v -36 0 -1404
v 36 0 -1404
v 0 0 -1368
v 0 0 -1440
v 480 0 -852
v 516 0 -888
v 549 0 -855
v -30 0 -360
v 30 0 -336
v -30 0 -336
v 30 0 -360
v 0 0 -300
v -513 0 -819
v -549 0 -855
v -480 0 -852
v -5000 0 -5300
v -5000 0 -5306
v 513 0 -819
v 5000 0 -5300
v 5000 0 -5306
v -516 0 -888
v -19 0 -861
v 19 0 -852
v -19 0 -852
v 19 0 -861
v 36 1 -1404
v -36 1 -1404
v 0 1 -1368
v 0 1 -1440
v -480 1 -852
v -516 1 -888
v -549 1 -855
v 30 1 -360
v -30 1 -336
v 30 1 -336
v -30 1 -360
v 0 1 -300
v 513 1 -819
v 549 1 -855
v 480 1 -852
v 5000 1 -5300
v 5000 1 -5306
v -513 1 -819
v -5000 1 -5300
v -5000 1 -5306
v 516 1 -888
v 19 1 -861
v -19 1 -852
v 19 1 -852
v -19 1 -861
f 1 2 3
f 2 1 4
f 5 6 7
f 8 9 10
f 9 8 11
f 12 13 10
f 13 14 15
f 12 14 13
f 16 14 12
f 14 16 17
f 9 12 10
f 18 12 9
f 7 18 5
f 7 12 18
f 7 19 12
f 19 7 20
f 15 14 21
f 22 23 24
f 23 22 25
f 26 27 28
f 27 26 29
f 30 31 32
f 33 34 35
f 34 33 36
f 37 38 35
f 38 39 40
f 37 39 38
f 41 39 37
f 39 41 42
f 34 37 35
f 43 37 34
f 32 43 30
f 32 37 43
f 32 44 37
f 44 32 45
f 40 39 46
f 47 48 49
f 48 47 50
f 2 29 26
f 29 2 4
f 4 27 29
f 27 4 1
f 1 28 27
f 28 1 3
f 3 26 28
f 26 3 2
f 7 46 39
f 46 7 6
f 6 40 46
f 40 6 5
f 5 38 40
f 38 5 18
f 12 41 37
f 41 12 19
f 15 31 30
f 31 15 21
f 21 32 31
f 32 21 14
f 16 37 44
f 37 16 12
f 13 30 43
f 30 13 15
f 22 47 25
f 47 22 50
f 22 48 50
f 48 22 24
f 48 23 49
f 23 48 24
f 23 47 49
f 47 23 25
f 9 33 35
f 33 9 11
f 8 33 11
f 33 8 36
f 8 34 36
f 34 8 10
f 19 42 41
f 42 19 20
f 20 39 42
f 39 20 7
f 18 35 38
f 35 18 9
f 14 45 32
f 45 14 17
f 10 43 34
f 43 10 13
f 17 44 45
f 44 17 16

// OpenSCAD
$fs = 120;

$vpt = [0,1080,480];
$vpr = [-34,0,0];
$vpf = 45;

foul_line = 6;
plain_color = [1,1,1,0.8];
out_color = [1,0.75,0.75,0.8];
eat_color = [0.5,0.75,1,0.8];

// home, first, second, third, rubber
color([1,1,1]) scale([1,-1,-1]) rotate([90,0,0]) linear_extrude(1) {
    polygon([[-30,30*2+300],[30,30*2+300],[30,30+300],[0,300],[-30,30+300]]);
    polygon([[552-36*2,852],[552-36,852+36],[552,852],[552-36,852-36]]);
    polygon([[0,1404+36],[36,1404],[0,1404-36],[-36,1404]]);
    polygon([[-552+36*2,852],[-552+36,852+36],[-552,852],[-552+36,852-36]]);
    polygon([[-19,852],[19,852],[19,9+852],[-19,9+852]]);
}

// foul lines
color([1,1,1,0.5]) scale([1,-1,-1]) rotate([90,0,0]) linear_extrude(1) {
    polygon([[0,300],[-5000,300+5000],[-5000,300+5000+foul_line],[0,300+foul_line]]);
    polygon([[0,300],[5000,300+5000],[5000,300+5000+foul_line],[0,300+foul_line]]);
}

scale([0.1,0.1,-0.1]) translate([-23200,0,0]) {
    color(out_color) polyhedron([[4710,0,34710],[9920,0,38000],[4710,10000,34710],[9920,10000,38000]], [[0,1,3,2]]);
    color(out_color) polyhedron([[4710,0,34710],[3360,0,35840],[4710,10000,34710],[3360,10000,35840]], [[0,1,3,2]]);
    color(out_color) polyhedron([[9920,0,38000],[8570,0,39130],[9920,10000,38000],[8570,10000,39130]], [[0,1,3,2]]);
    color(out_color) polyhedron([[3360,0,35840],[8570,0,39130],[3360,10000,35840],[8570,10000,39130]], [[0,1,3,2]]);
    color(out_color) polyhedron([[4710,10000,34710],[3360,10000,35840],[9920,10000,38000],[8570,10000,39130]], [[0,1,3,2]]);
    color(out_color) polyhedron([[20370,0,1880],[20470,0,1880],[20370,1000,1880],[20470,1000,1880]], [[0,1,3,2]]);
    color(out_color) polyhedron([[20370,0,1880],[11610,0,11060],[20370,1000,1880],[11610,1000,11060]], [[0,1,3,2]]);
    color(out_color) polyhedron([[20470,0,1880],[11710,0,11060],[20470,1000,1880],[11710,1000,11060]], [[0,1,3,2]]);
    color(out_color) polyhedron([[11610,0,11060],[11710,0,11060],[11610,1000,11060],[11710,1000,11060]], [[0,1,3,2]]);
    color(out_color) polyhedron([[20370,1000,1880],[11610,1000,11060],[20470,1000,1880],[11710,1000,11060]], [[0,1,3,2]]);
    color(out_color) polyhedron([[7000,0,17526],[23910,0,31780],[7000,1200,17526],[23910,1200,31780]], [[0,1,3,2]]);
    color(out_color) polyhedron([[7000,0,17526],[7000,0,17536],[7000,1200,17526],[7000,1200,17536]], [[0,1,3,2]]);
    color(out_color) polyhedron([[23910,0,31780],[23910,0,31880],[23910,1200,31780],[23910,1200,31880]], [[0,1,3,2]]);
    color(out_color) polyhedron([[7000,0,17536],[23910,0,31880],[7000,1200,17536],[23910,1200,31880]], [[0,1,3,2]]);
    color(out_color) polyhedron([[7000,1200,17526],[7000,1200,17536],[23910,1200,31780],[23910,1200,31880]], [[0,1,3,2]]);
    color(out_color) polyhedron([[10010,0,42380],[23910,0,31780],[10010,1200,42380],[23910,1200,31780]], [[0,1,3,2]]);
    color(out_color) polyhedron([[10010,0,42380],[10010,0,43380],[10010,1200,42380],[10010,1200,43380]], [[0,1,3,2]]);
    color(out_color) polyhedron([[23910,0,31780],[23910,0,31880],[23910,1200,31780],[23910,1200,31880]], [[0,1,3,2]]);
    color(out_color) polyhedron([[10010,0,43380],[23910,0,31880],[10010,1200,43380],[23910,1200,31880]], [[0,1,3,2]]);
    color(out_color) polyhedron([[10010,1200,42380],[10010,1200,43380],[23910,1200,31780],[23910,1200,31880]], [[0,1,3,2]]);
    color(out_color) polyhedron([[23910,0,31780],[34390,0,41680],[23910,1200,31780],[34390,1200,41680]], [[0,1,3,2]]);
    color(out_color) polyhedron([[23910,0,31780],[23910,0,31880],[23910,1200,31780],[23910,1200,31880]], [[0,1,3,2]]);
    color(out_color) polyhedron([[34390,0,41680],[34390,0,41780],[34390,1200,41680],[34390,1200,41780]], [[0,1,3,2]]);
    color(out_color) polyhedron([[23910,0,31880],[34390,0,41780],[23910,1200,31880],[34390,1200,41780]], [[0,1,3,2]]);
    color(out_color) polyhedron([[23910,1200,31780],[23910,1200,31880],[34390,1200,41680],[34390,1200,41780]], [[0,1,3,2]]);
    color(out_color) polyhedron([[23910,0,31780],[40000,0,18656],[23910,1200,31780],[40000,1200,18656]], [[0,1,3,2]]);
    color(out_color) polyhedron([[23910,0,31780],[23910,0,31880],[23910,1200,31780],[23910,1200,31880]], [[0,1,3,2]]);
    color(out_color) polyhedron([[40000,0,18656],[40000,0,18666],[40000,1200,18656],[40000,1200,18666]], [[0,1,3,2]]);
    color(out_color) polyhedron([[23910,0,31880],[40000,0,18666],[23910,1200,31880],[40000,1200,18666]], [[0,1,3,2]]);
    color(out_color) polyhedron([[23910,1200,31780],[23910,1200,31880],[40000,1200,18656],[40000,1200,18666]], [[0,1,3,2]]);
    color(out_color) polyhedron([[32070,0,32440],[34250,0,31940],[32070,10000,32440],[34250,10000,31940]], [[0,1,3,2]]);
    color(out_color) polyhedron([[32070,0,32440],[32070,0,32540],[32070,10000,32440],[32070,10000,32540]], [[0,1,3,2]]);
    color(out_color) polyhedron([[34250,0,31940],[34250,0,32040],[34250,10000,31940],[34250,10000,32040]], [[0,1,3,2]]);
    color(out_color) polyhedron([[32070,0,32540],[34250,0,32040],[32070,10000,32540],[34250,10000,32040]], [[0,1,3,2]]);
    color(out_color) polyhedron([[32070,10000,32440],[32070,10000,32540],[34250,10000,31940],[34250,10000,32040]], [[0,1,3,2]]);
    color(out_color) polyhedron([[24650,0,1910],[35210,0,12300],[24650,5,1910],[35210,5,12300]], [[0,1,3,2]]);
    color(out_color) polyhedron([[24650,0,1910],[24650,0,2010],[24650,5,1910],[24650,5,2010]], [[0,1,3,2]]);
    color(out_color) polyhedron([[35210,0,12300],[35210,0,12400],[35210,5,12300],[35210,5,12400]], [[0,1,3,2]]);
    color(out_color) polyhedron([[24650,0,2010],[35210,0,12400],[24650,5,2010],[35210,5,12400]], [[0,1,3,2]]);
    color(out_color) polyhedron([[24650,5,1910],[24650,5,2010],[35210,5,12300],[35210,5,12400]], [[0,1,3,2]]);
    color(plain_color) polyhedron([[34620,0,22160],[36650,0,20500],[34620,1000,22160],[36650,1000,20500]], [[0,1,3,2]]);
    color(plain_color) polyhedron([[34620,0,22160],[34620,0,23040],[34620,1000,22160],[34620,1100,23040]], [[0,1,3,2]]);
    color(plain_color) polyhedron([[36650,0,20500],[36650,0,21380],[36650,1000,20500],[36650,1100,21380]], [[0,1,3,2]]);
    color(plain_color) polyhedron([[34620,0,23040],[36650,0,21380],[34620,1100,23040],[36650,1100,21380]], [[0,1,3,2]]);
    color(plain_color) polyhedron([[34620,1000,22160],[34620,1100,23040],[36650,1000,20500],[36650,1100,21380]], [[0,1,3,2]]);
    color(plain_color) polyhedron([[36500,0,16300],[37200,0,17000],[36500,1000,16300],[37200,1000,17000]], [[0,1,3,2]]);
    color(plain_color) polyhedron([[36500,0,16300],[36100,0,21820],[36500,1000,16300],[36100,1100,21820]], [[0,1,3,2]]);
    color(plain_color) polyhedron([[37200,0,17000],[37100,0,21010],[37200,1000,17000],[37100,1100,21010]], [[0,1,3,2]]);
    color(plain_color) polyhedron([[36100,0,21820],[37100,0,21010],[36100,1100,21820],[37100,1100,21010]], [[0,1,3,2]]);
    color(plain_color) polyhedron([[36500,1000,16300],[36100,1100,21820],[37200,1000,17000],[37100,1100,21010]], [[0,1,3,2]]);
    color(plain_color) polyhedron([[35010,0,16310],[35700,0,15500],[35010,900,16310],[35700,900,15500]], [[0,1,3,2]]);
    color(plain_color) polyhedron([[35010,0,16310],[39500,0,19300],[35010,900,16310],[39500,1000,19300]], [[0,1,3,2]]);
    color(plain_color) polyhedron([[35700,0,15500],[40190,0,20800],[35700,900,15500],[40190,1000,20800]], [[0,1,3,2]]);
    color(plain_color) polyhedron([[39500,0,19300],[40190,0,20800],[39500,1000,19300],[40190,1000,20800]], [[0,1,3,2]]);
    color(plain_color) polyhedron([[35010,900,16310],[39500,1000,19300],[35700,900,15500],[40190,1000,20800]], [[0,1,3,2]]);
    color(plain_color) polyhedron([[37200,0,17000],[37300,0,17000],[37200,2000,17000],[37300,2000,17000]], [[0,1,3,2]]);
    color(plain_color) polyhedron([[37200,0,17000],[37100,0,21010],[37200,2000,17000],[37100,2000,21010]], [[0,1,3,2]]);
    color(plain_color) polyhedron([[37300,0,17000],[37200,0,21010],[37300,2000,17000],[37200,2000,21010]], [[0,1,3,2]]);
    color(plain_color) polyhedron([[37100,0,21010],[37200,0,21010],[37100,2000,21010],[37200,2000,21010]], [[0,1,3,2]]);
    color(plain_color) polyhedron([[37200,2000,17000],[37100,2000,21010],[37300,2000,17000],[37200,2000,21010]], [[0,1,3,2]]);
    color(plain_color) polyhedron([[10830,0,13520],[11850,0,13040],[10830,500,13520],[11850,500,13040]], [[0,1,3,2]]);
    color(plain_color) polyhedron([[10830,0,13520],[11120,0,14160],[10830,500,13520],[11120,500,14160]], [[0,1,3,2]]);
    color(plain_color) polyhedron([[11850,0,13040],[12060,0,13940],[11850,500,13040],[12060,500,13940]], [[0,1,3,2]]);
    color(plain_color) polyhedron([[11120,0,14160],[12060,0,13940],[11120,500,14160],[12060,500,13940]], [[0,1,3,2]]);
    color(plain_color) polyhedron([[10830,500,13520],[11120,500,14160],[11850,500,13040],[12060,500,13940]], [[0,1,3,2]]);
    color(eat_color) polyhedron([[9740,0,26220],[11110,0,28270],[9740,700,26220],[11110,700,28270]], [[0,1,3,2]]);
    color(eat_color) polyhedron([[9740,0,26220],[8660,0,27280],[9740,700,26220],[8660,700,27280]], [[0,1,3,2]]);
    color(eat_color) polyhedron([[11110,0,28270],[10030,0,29330],[11110,700,28270],[10030,700,29330]], [[0,1,3,2]]);
    color(eat_color) polyhedron([[8660,0,27280],[10030,0,29330],[8660,700,27280],[10030,700,29330]], [[0,1,3,2]]);
    color(eat_color) polyhedron([[9740,700,26220],[8660,700,27280],[11110,700,28270],[10030,700,29330]], [[0,1,3,2]]);
    color(plain_color) polyhedron([[0,0,0],[0,0,0],[0,0,0],[0,0,0]], [[0,1,3,2]]);
    color(plain_color) polyhedron([[0,0,0],[0,0,0],[0,0,0],[0,0,0]], [[0,1,3,2]]);
    color(plain_color) polyhedron([[0,0,0],[0,0,0],[0,0,0],[0,0,0]], [[0,1,3,2]]);
    color(plain_color) polyhedron([[0,0,0],[0,0,0],[0,0,0],[0,0,0]], [[0,1,3,2]]);
    color(plain_color) polyhedron([[0,0,0],[0,0,0],[0,0,0],[0,0,0]], [[0,1,3,2]]);
    color(plain_color) polyhedron([[0,0,0],[0,0,0],[0,0,0],[0,0,0]], [[0,1,3,2]]);
    color(plain_color) polyhedron([[0,0,0],[0,0,0],[0,0,0],[0,0,0]], [[0,1,3,2]]);
    color(plain_color) polyhedron([[0,0,0],[0,0,0],[0,0,0],[0,0,0]], [[0,1,3,2]]);
    color(plain_color) polyhedron([[0,0,0],[0,0,0],[0,0,0],[0,0,0]], [[0,1,3,2]]);
    color(plain_color) polyhedron([[0,0,0],[0,0,0],[0,0,0],[0,0,0]], [[0,1,3,2]]);
    color(plain_color) polyhedron([[0,0,0],[0,0,0],[0,0,0],[0,0,0]], [[0,1,3,2]]);
    color(plain_color) polyhedron([[0,0,0],[0,0,0],[0,0,0],[0,0,0]], [[0,1,3,2]]);
    color(plain_color) polyhedron([[0,0,0],[0,0,0],[0,0,0],[0,0,0]], [[0,1,3,2]]);
    color(plain_color) polyhedron([[0,0,0],[0,0,0],[0,0,0],[0,0,0]], [[0,1,3,2]]);
    color(plain_color) polyhedron([[0,0,0],[0,0,0],[0,0,0],[0,0,0]], [[0,1,3,2]]);
    color(plain_color) polyhedron([[0,0,0],[0,0,0],[0,0,0],[0,0,0]], [[0,1,3,2]]);
    color(plain_color) polyhedron([[0,0,0],[0,0,0],[0,0,0],[0,0,0]], [[0,1,3,2]]);
    color(plain_color) polyhedron([[0,0,0],[0,0,0],[0,0,0],[0,0,0]], [[0,1,3,2]]);
    color(plain_color) polyhedron([[0,0,0],[0,0,0],[0,0,0],[0,0,0]], [[0,1,3,2]]);
    color(plain_color) polyhedron([[0,0,0],[0,0,0],[0,0,0],[0,0,0]], [[0,1,3,2]]);
    color(plain_color) polyhedron([[0,0,0],[0,0,0],[0,0,0],[0,0,0]], [[0,1,3,2]]);
    color(plain_color) polyhedron([[0,0,0],[0,0,0],[0,0,0],[0,0,0]], [[0,1,3,2]]);
    color(plain_color) polyhedron([[0,0,0],[0,0,0],[0,0,0],[0,0,0]], [[0,1,3,2]]);
    color(plain_color) polyhedron([[0,0,0],[0,0,0],[0,0,0],[0,0,0]], [[0,1,3,2]]);
    color(plain_color) polyhedron([[0,0,0],[0,0,0],[0,0,0],[0,0,0]], [[0,1,3,2]]);
    color(plain_color) polyhedron([[0,0,0],[0,0,0],[0,0,0],[0,0,0]], [[0,1,3,2]]);
    color(plain_color) polyhedron([[0,0,0],[0,0,0],[0,0,0],[0,0,0]], [[0,1,3,2]]);
    color(plain_color) polyhedron([[0,0,0],[0,0,0],[0,0,0],[0,0,0]], [[0,1,3,2]]);
    color(plain_color) polyhedron([[0,0,0],[0,0,0],[0,0,0],[0,0,0]], [[0,1,3,2]]);
    color(plain_color) polyhedron([[0,0,0],[0,0,0],[0,0,0],[0,0,0]], [[0,1,3,2]]);
    color(plain_color) polyhedron([[0,0,0],[0,0,0],[0,0,0],[0,0,0]], [[0,1,3,2]]);
    color(plain_color) polyhedron([[0,0,0],[0,0,0],[0,0,0],[0,0,0]], [[0,1,3,2]]);
    color(plain_color) polyhedron([[0,0,0],[0,0,0],[0,0,0],[0,0,0]], [[0,1,3,2]]);
    color(plain_color) polyhedron([[0,0,0],[0,0,0],[0,0,0],[0,0,0]], [[0,1,3,2]]);
    color(plain_color) polyhedron([[0,0,0],[0,0,0],[0,0,0],[0,0,0]], [[0,1,3,2]]);
    color(plain_color) polyhedron([[0,0,0],[0,0,0],[0,0,0],[0,0,0]], [[0,1,3,2]]);
    color(plain_color) polyhedron([[0,0,0],[0,0,0],[0,0,0],[0,0,0]], [[0,1,3,2]]);
    color(plain_color) polyhedron([[0,0,0],[0,0,0],[0,0,0],[0,0,0]], [[0,1,3,2]]);
    color(plain_color) polyhedron([[0,0,0],[0,0,0],[0,0,0],[0,0,0]], [[0,1,3,2]]);
    color(plain_color) polyhedron([[0,0,0],[0,0,0],[0,0,0],[0,0,0]], [[0,1,3,2]]);
    color(plain_color) polyhedron([[0,0,0],[0,0,0],[0,0,0],[0,0,0]], [[0,1,3,2]]);
    color(plain_color) polyhedron([[0,0,0],[0,0,0],[0,0,0],[0,0,0]], [[0,1,3,2]]);
    color(plain_color) polyhedron([[0,0,0],[0,0,0],[0,0,0],[0,0,0]], [[0,1,3,2]]);
    color(plain_color) polyhedron([[0,0,0],[0,0,0],[0,0,0],[0,0,0]], [[0,1,3,2]]);
    color(plain_color) polyhedron([[0,0,0],[0,0,0],[0,0,0],[0,0,0]], [[0,1,3,2]]);
    color(plain_color) polyhedron([[0,0,0],[0,0,0],[0,0,0],[0,0,0]], [[0,1,3,2]]);
    color(plain_color) polyhedron([[0,0,0],[0,0,0],[0,0,0],[0,0,0]], [[0,1,3,2]]);
    color(plain_color) polyhedron([[0,0,0],[0,0,0],[0,0,0],[0,0,0]], [[0,1,3,2]]);
    color(plain_color) polyhedron([[0,0,0],[0,0,0],[0,0,0],[0,0,0]], [[0,1,3,2]]);
    color(plain_color) polyhedron([[0,0,0],[0,0,0],[0,0,0],[0,0,0]], [[0,1,3,2]]);
    color(plain_color) polyhedron([[0,0,0],[0,0,0],[0,0,0],[0,0,0]], [[0,1,3,2]]);
    color(plain_color) polyhedron([[0,0,0],[0,0,0],[0,0,0],[0,0,0]], [[0,1,3,2]]);
    color(plain_color) polyhedron([[0,0,0],[0,0,0],[0,0,0],[0,0,0]], [[0,1,3,2]]);
    color(plain_color) polyhedron([[0,0,0],[0,0,0],[0,0,0],[0,0,0]], [[0,1,3,2]]);
    color(plain_color) polyhedron([[0,0,0],[0,0,0],[0,0,0],[0,0,0]], [[0,1,3,2]]);
    color(plain_color) polyhedron([[0,0,0],[0,0,0],[0,0,0],[0,0,0]], [[0,1,3,2]]);
    color(plain_color) polyhedron([[0,0,0],[0,0,0],[0,0,0],[0,0,0]], [[0,1,3,2]]);
    color(plain_color) polyhedron([[0,0,0],[0,0,0],[0,0,0],[0,0,0]], [[0,1,3,2]]);
    color(plain_color) polyhedron([[0,0,0],[0,0,0],[0,0,0],[0,0,0]], [[0,1,3,2]]);
    color(plain_color) polyhedron([[0,0,0],[0,0,0],[0,0,0],[0,0,0]], [[0,1,3,2]]);
    color(plain_color) polyhedron([[0,0,0],[0,0,0],[0,0,0],[0,0,0]], [[0,1,3,2]]);
    color(plain_color) polyhedron([[0,0,0],[0,0,0],[0,0,0],[0,0,0]], [[0,1,3,2]]);
    color(plain_color) polyhedron([[0,0,0],[0,0,0],[0,0,0],[0,0,0]], [[0,1,3,2]]);
    color(plain_color) polyhedron([[0,0,0],[0,0,0],[0,0,0],[0,0,0]], [[0,1,3,2]]);
    color(plain_color) polyhedron([[0,0,0],[0,0,0],[0,0,0],[0,0,0]], [[0,1,3,2]]);
    color(plain_color) polyhedron([[0,0,0],[0,0,0],[0,0,0],[0,0,0]], [[0,1,3,2]]);
    color(plain_color) polyhedron([[0,0,0],[0,0,0],[0,0,0],[0,0,0]], [[0,1,3,2]]);
    color(plain_color) polyhedron([[0,0,0],[0,0,0],[0,0,0],[0,0,0]], [[0,1,3,2]]);
    color(plain_color) polyhedron([[0,0,0],[0,0,0],[0,0,0],[0,0,0]], [[0,1,3,2]]);
    color(plain_color) polyhedron([[0,0,0],[0,0,0],[0,0,0],[0,0,0]], [[0,1,3,2]]);
    color(plain_color) polyhedron([[0,0,0],[0,0,0],[0,0,0],[0,0,0]], [[0,1,3,2]]);
    color(plain_color) polyhedron([[0,0,0],[0,0,0],[0,0,0],[0,0,0]], [[0,1,3,2]]);
    color(plain_color) polyhedron([[0,0,0],[0,0,0],[0,0,0],[0,0,0]], [[0,1,3,2]]);
    color(plain_color) polyhedron([[0,0,0],[0,0,0],[0,0,0],[0,0,0]], [[0,1,3,2]]);
    color(plain_color) polyhedron([[0,0,0],[0,0,0],[0,0,0],[0,0,0]], [[0,1,3,2]]);
    color(plain_color) polyhedron([[0,0,0],[0,0,0],[0,0,0],[0,0,0]], [[0,1,3,2]]);
    color(plain_color) polyhedron([[0,0,0],[0,0,0],[0,0,0],[0,0,0]], [[0,1,3,2]]);
    color(plain_color) polyhedron([[0,0,0],[0,0,0],[0,0,0],[0,0,0]], [[0,1,3,2]]);
    color(plain_color) polyhedron([[0,0,0],[0,0,0],[0,0,0],[0,0,0]], [[0,1,3,2]]);
    color(plain_color) polyhedron([[0,0,0],[0,0,0],[0,0,0],[0,0,0]], [[0,1,3,2]]);
    color(plain_color) polyhedron([[0,0,0],[0,0,0],[0,0,0],[0,0,0]], [[0,1,3,2]]);
    color(plain_color) polyhedron([[0,0,0],[0,0,0],[0,0,0],[0,0,0]], [[0,1,3,2]]);
    color(plain_color) polyhedron([[0,0,0],[0,0,0],[0,0,0],[0,0,0]], [[0,1,3,2]]);
    color(plain_color) polyhedron([[0,0,0],[0,0,0],[0,0,0],[0,0,0]], [[0,1,3,2]]);
    color(plain_color) polyhedron([[0,0,0],[0,0,0],[0,0,0],[0,0,0]], [[0,1,3,2]]);
    color(plain_color) polyhedron([[0,0,0],[0,0,0],[0,0,0],[0,0,0]], [[0,1,3,2]]);
    color(plain_color) polyhedron([[0,0,0],[0,0,0],[0,0,0],[0,0,0]], [[0,1,3,2]]);
    color(plain_color) polyhedron([[0,0,0],[0,0,0],[0,0,0],[0,0,0]], [[0,1,3,2]]);
    color(plain_color) polyhedron([[0,0,0],[0,0,0],[0,0,0],[0,0,0]], [[0,1,3,2]]);
    color(plain_color) polyhedron([[0,0,0],[0,0,0],[0,0,0],[0,0,0]], [[0,1,3,2]]);
    color(plain_color) polyhedron([[0,0,0],[0,0,0],[0,0,0],[0,0,0]], [[0,1,3,2]]);
    color(plain_color) polyhedron([[0,0,0],[0,0,0],[0,0,0],[0,0,0]], [[0,1,3,2]]);
    color(plain_color) polyhedron([[0,0,0],[0,0,0],[0,0,0],[0,0,0]], [[0,1,3,2]]);
    color(plain_color) polyhedron([[0,0,0],[0,0,0],[0,0,0],[0,0,0]], [[0,1,3,2]]);
    color(plain_color) polyhedron([[0,0,0],[0,0,0],[0,0,0],[0,0,0]], [[0,1,3,2]]);
    color(plain_color) polyhedron([[0,0,0],[0,0,0],[0,0,0],[0,0,0]], [[0,1,3,2]]);
    color(plain_color) polyhedron([[0,0,0],[0,0,0],[0,0,0],[0,0,0]], [[0,1,3,2]]);
    color(plain_color) polyhedron([[0,0,0],[0,0,0],[0,0,0],[0,0,0]], [[0,1,3,2]]);
    color(plain_color) polyhedron([[0,0,0],[0,0,0],[0,0,0],[0,0,0]], [[0,1,3,2]]);
    color(plain_color) polyhedron([[0,0,0],[0,0,0],[0,0,0],[0,0,0]], [[0,1,3,2]]);
    color(plain_color) polyhedron([[0,0,0],[0,0,0],[0,0,0],[0,0,0]], [[0,1,3,2]]);
    color(plain_color) polyhedron([[0,0,0],[0,0,0],[0,0,0],[0,0,0]], [[0,1,3,2]]);
    color(plain_color) polyhedron([[0,0,0],[0,0,0],[0,0,0],[0,0,0]], [[0,1,3,2]]);
    color(plain_color) polyhedron([[0,0,0],[0,0,0],[0,0,0],[0,0,0]], [[0,1,3,2]]);
    color(plain_color) polyhedron([[0,0,0],[0,0,0],[0,0,0],[0,0,0]], [[0,1,3,2]]);
    color(plain_color) polyhedron([[0,0,0],[0,0,0],[0,0,0],[0,0,0]], [[0,1,3,2]]);
    color(plain_color) polyhedron([[0,0,0],[0,0,0],[0,0,0],[0,0,0]], [[0,1,3,2]]);
    color(plain_color) polyhedron([[0,0,0],[0,0,0],[0,0,0],[0,0,0]], [[0,1,3,2]]);
    color(plain_color) polyhedron([[0,0,0],[0,0,0],[0,0,0],[0,0,0]], [[0,1,3,2]]);
    color(plain_color) polyhedron([[0,0,0],[0,0,0],[0,0,0],[0,0,0]], [[0,1,3,2]]);
    color(plain_color) polyhedron([[0,0,0],[0,0,0],[0,0,0],[0,0,0]], [[0,1,3,2]]);
    color(plain_color) polyhedron([[0,0,0],[0,0,0],[0,0,0],[0,0,0]], [[0,1,3,2]]);
    color(plain_color) polyhedron([[0,0,0],[0,0,0],[0,0,0],[0,0,0]], [[0,1,3,2]]);
    color(plain_color) polyhedron([[0,0,0],[0,0,0],[0,0,0],[0,0,0]], [[0,1,3,2]]);
    color(plain_color) polyhedron([[0,0,0],[0,0,0],[0,0,0],[0,0,0]], [[0,1,3,2]]);
    color(plain_color) polyhedron([[0,0,0],[0,0,0],[0,0,0],[0,0,0]], [[0,1,3,2]]);
    color(plain_color) polyhedron([[0,0,0],[0,0,0],[0,0,0],[0,0,0]], [[0,1,3,2]]);
    color(plain_color) polyhedron([[0,0,0],[0,0,0],[0,0,0],[0,0,0]], [[0,1,3,2]]);
    color(plain_color) polyhedron([[0,0,0],[0,0,0],[0,0,0],[0,0,0]], [[0,1,3,2]]);
    color(plain_color) polyhedron([[0,0,0],[0,0,0],[0,0,0],[0,0,0]], [[0,1,3,2]]);
    color(plain_color) polyhedron([[0,0,0],[0,0,0],[0,0,0],[0,0,0]], [[0,1,3,2]]);
    color(plain_color) polyhedron([[0,0,0],[0,0,0],[0,0,0],[0,0,0]], [[0,1,3,2]]);
    color(plain_color) polyhedron([[0,0,0],[0,0,0],[0,0,0],[0,0,0]], [[0,1,3,2]]);
    color(plain_color) polyhedron([[0,0,0],[0,0,0],[0,0,0],[0,0,0]], [[0,1,3,2]]);
    color(plain_color) polyhedron([[0,0,0],[0,0,0],[0,0,0],[0,0,0]], [[0,1,3,2]]);
    color(plain_color) polyhedron([[0,0,0],[0,0,0],[0,0,0],[0,0,0]], [[0,1,3,2]]);
    color(plain_color) polyhedron([[0,0,0],[0,0,0],[0,0,0],[0,0,0]], [[0,1,3,2]]);
    color(plain_color) polyhedron([[0,0,0],[0,0,0],[0,0,0],[0,0,0]], [[0,1,3,2]]);
    color(plain_color) polyhedron([[0,0,0],[0,0,0],[0,0,0],[0,0,0]], [[0,1,3,2]]);
    color(plain_color) polyhedron([[0,0,0],[0,0,0],[0,0,0],[0,0,0]], [[0,1,3,2]]);
    color(plain_color) polyhedron([[0,0,0],[0,0,0],[0,0,0],[0,0,0]], [[0,1,3,2]]);
    color(plain_color) polyhedron([[0,0,0],[0,0,0],[0,0,0],[0,0,0]], [[0,1,3,2]]);
    color(plain_color) polyhedron([[0,0,0],[0,0,0],[0,0,0],[0,0,0]], [[0,1,3,2]]);
    color(plain_color) polyhedron([[0,0,0],[0,0,0],[0,0,0],[0,0,0]], [[0,1,3,2]]);
    color(plain_color) polyhedron([[0,0,0],[0,0,0],[0,0,0],[0,0,0]], [[0,1,3,2]]);
    color(plain_color) polyhedron([[0,0,0],[0,0,0],[0,0,0],[0,0,0]], [[0,1,3,2]]);
    color(plain_color) polyhedron([[0,0,0],[0,0,0],[0,0,0],[0,0,0]], [[0,1,3,2]]);
    color(plain_color) polyhedron([[0,0,0],[0,0,0],[0,0,0],[0,0,0]], [[0,1,3,2]]);
    color(plain_color) polyhedron([[0,0,0],[0,0,0],[0,0,0],[0,0,0]], [[0,1,3,2]]);
    color(plain_color) polyhedron([[0,0,0],[0,0,0],[0,0,0],[0,0,0]], [[0,1,3,2]]);
    color(plain_color) polyhedron([[0,0,0],[0,0,0],[0,0,0],[0,0,0]], [[0,1,3,2]]);
    color(plain_color) polyhedron([[0,0,0],[0,0,0],[0,0,0],[0,0,0]], [[0,1,3,2]]);
    color(plain_color) polyhedron([[0,0,0],[0,0,0],[0,0,0],[0,0,0]], [[0,1,3,2]]);
    color(plain_color) polyhedron([[0,0,0],[0,0,0],[0,0,0],[0,0,0]], [[0,1,3,2]]);
    color(plain_color) polyhedron([[0,0,0],[0,0,0],[0,0,0],[0,0,0]], [[0,1,3,2]]);
    color(plain_color) polyhedron([[0,0,0],[0,0,0],[0,0,0],[0,0,0]], [[0,1,3,2]]);
    color(plain_color) polyhedron([[0,0,0],[0,0,0],[0,0,0],[0,0,0]], [[0,1,3,2]]);
    color(plain_color) polyhedron([[0,0,0],[0,0,0],[0,0,0],[0,0,0]], [[0,1,3,2]]);
    color(plain_color) polyhedron([[0,0,0],[0,0,0],[0,0,0],[0,0,0]], [[0,1,3,2]]);
    color(plain_color) polyhedron([[0,0,0],[0,0,0],[0,0,0],[0,0,0]], [[0,1,3,2]]);
    color(plain_color) polyhedron([[0,0,0],[0,0,0],[0,0,0],[0,0,0]], [[0,1,3,2]]);
    color(plain_color) polyhedron([[0,0,0],[0,0,0],[0,0,0],[0,0,0]], [[0,1,3,2]]);
    color(plain_color) polyhedron([[0,0,0],[0,0,0],[0,0,0],[0,0,0]], [[0,1,3,2]]);
    color(plain_color) polyhedron([[0,0,0],[0,0,0],[0,0,0],[0,0,0]], [[0,1,3,2]]);
    color(plain_color) polyhedron([[0,0,0],[0,0,0],[0,0,0],[0,0,0]], [[0,1,3,2]]);
    color(plain_color) polyhedron([[0,0,0],[0,0,0],[0,0,0],[0,0,0]], [[0,1,3,2]]);
    color(plain_color) polyhedron([[0,0,0],[0,0,0],[0,0,0],[0,0,0]], [[0,1,3,2]]);
    color(plain_color) polyhedron([[0,0,0],[0,0,0],[0,0,0],[0,0,0]], [[0,1,3,2]]);
    color(plain_color) polyhedron([[0,0,0],[0,0,0],[0,0,0],[0,0,0]], [[0,1,3,2]]);
    color(plain_color) polyhedron([[0,0,0],[0,0,0],[0,0,0],[0,0,0]], [[0,1,3,2]]);
    color(plain_color) polyhedron([[0,0,0],[0,0,0],[0,0,0],[0,0,0]], [[0,1,3,2]]);
    color(plain_color) polyhedron([[0,0,0],[0,0,0],[0,0,0],[0,0,0]], [[0,1,3,2]]);
    color(plain_color) polyhedron([[0,0,0],[0,0,0],[0,0,0],[0,0,0]], [[0,1,3,2]]);
    color(plain_color) polyhedron([[0,0,0],[0,0,0],[0,0,0],[0,0,0]], [[0,1,3,2]]);
    color(plain_color) polyhedron([[0,0,0],[0,0,0],[0,0,0],[0,0,0]], [[0,1,3,2]]);
    color(plain_color) polyhedron([[0,0,0],[0,0,0],[0,0,0],[0,0,0]], [[0,1,3,2]]);
    color(plain_color) polyhedron([[0,0,0],[0,0,0],[0,0,0],[0,0,0]], [[0,1,3,2]]);
    color(plain_color) polyhedron([[0,0,0],[0,0,0],[0,0,0],[0,0,0]], [[0,1,3,2]]);
    color(plain_color) polyhedron([[0,0,0],[0,0,0],[0,0,0],[0,0,0]], [[0,1,3,2]]);
    color(plain_color) polyhedron([[0,0,0],[0,0,0],[0,0,0],[0,0,0]], [[0,1,3,2]]);
    color(plain_color) polyhedron([[0,0,0],[0,0,0],[0,0,0],[0,0,0]], [[0,1,3,2]]);
    color(plain_color) polyhedron([[0,0,0],[0,0,0],[0,0,0],[0,0,0]], [[0,1,3,2]]);
    color(plain_color) polyhedron([[0,0,0],[0,0,0],[0,0,0],[0,0,0]], [[0,1,3,2]]);
    color(plain_color) polyhedron([[0,0,0],[0,0,0],[0,0,0],[0,0,0]], [[0,1,3,2]]);
    color(plain_color) polyhedron([[0,0,0],[0,0,0],[0,0,0],[0,0,0]], [[0,1,3,2]]);
    color(plain_color) polyhedron([[0,0,0],[0,0,0],[0,0,0],[0,0,0]], [[0,1,3,2]]);
    color(plain_color) polyhedron([[0,0,0],[0,0,0],[0,0,0],[0,0,0]], [[0,1,3,2]]);
    color(plain_color) polyhedron([[0,0,0],[0,0,0],[0,0,0],[0,0,0]], [[0,1,3,2]]);
    color(plain_color) polyhedron([[0,0,0],[0,0,0],[0,0,0],[0,0,0]], [[0,1,3,2]]);
    color(plain_color) polyhedron([[0,0,0],[0,0,0],[0,0,0],[0,0,0]], [[0,1,3,2]]);
    color(plain_color) polyhedron([[0,0,0],[0,0,0],[0,0,0],[0,0,0]], [[0,1,3,2]]);
    color(plain_color) polyhedron([[0,0,0],[0,0,0],[0,0,0],[0,0,0]], [[0,1,3,2]]);
    color(plain_color) polyhedron([[0,0,0],[0,0,0],[0,0,0],[0,0,0]], [[0,1,3,2]]);
    color(plain_color) polyhedron([[0,0,0],[0,0,0],[0,0,0],[0,0,0]], [[0,1,3,2]]);
    color(plain_color) polyhedron([[0,0,0],[0,0,0],[0,0,0],[0,0,0]], [[0,1,3,2]]);
    color(plain_color) polyhedron([[0,0,0],[0,0,0],[0,0,0],[0,0,0]], [[0,1,3,2]]);
    color(plain_color) polyhedron([[0,0,0],[0,0,0],[0,0,0],[0,0,0]], [[0,1,3,2]]);
    color(plain_color) polyhedron([[0,0,0],[0,0,0],[0,0,0],[0,0,0]], [[0,1,3,2]]);
    color(plain_color) polyhedron([[0,0,0],[0,0,0],[0,0,0],[0,0,0]], [[0,1,3,2]]);
    color(plain_color) polyhedron([[0,0,0],[0,0,0],[0,0,0],[0,0,0]], [[0,1,3,2]]);
    color(plain_color) polyhedron([[0,0,0],[0,0,0],[0,0,0],[0,0,0]], [[0,1,3,2]]);
    color(plain_color) polyhedron([[0,0,0],[0,0,0],[0,0,0],[0,0,0]], [[0,1,3,2]]);
    color(plain_color) polyhedron([[0,0,0],[0,0,0],[0,0,0],[0,0,0]], [[0,1,3,2]]);
    color(plain_color) polyhedron([[0,0,0],[0,0,0],[0,0,0],[0,0,0]], [[0,1,3,2]]);
    color(plain_color) polyhedron([[0,0,0],[0,0,0],[0,0,0],[0,0,0]], [[0,1,3,2]]);
    color(plain_color) polyhedron([[0,0,0],[0,0,0],[0,0,0],[0,0,0]], [[0,1,3,2]]);
    color(plain_color) polyhedron([[0,0,0],[0,0,0],[0,0,0],[0,0,0]], [[0,1,3,2]]);
    color(plain_color) polyhedron([[0,0,0],[0,0,0],[0,0,0],[0,0,0]], [[0,1,3,2]]);
    color(plain_color) polyhedron([[0,0,0],[0,0,0],[0,0,0],[0,0,0]], [[0,1,3,2]]);
    color(plain_color) polyhedron([[0,0,0],[0,0,0],[0,0,0],[0,0,0]], [[0,1,3,2]]);
    color(plain_color) polyhedron([[0,0,0],[0,0,0],[0,0,0],[0,0,0]], [[0,1,3,2]]);
    color(plain_color) polyhedron([[0,0,0],[0,0,0],[0,0,0],[0,0,0]], [[0,1,3,2]]);
    color(plain_color) polyhedron([[0,0,0],[0,0,0],[0,0,0],[0,0,0]], [[0,1,3,2]]);
    color(plain_color) polyhedron([[0,0,0],[0,0,0],[0,0,0],[0,0,0]], [[0,1,3,2]]);
    color(plain_color) polyhedron([[0,0,0],[0,0,0],[0,0,0],[0,0,0]], [[0,1,3,2]]);
    color(plain_color) polyhedron([[0,0,0],[0,0,0],[0,0,0],[0,0,0]], [[0,1,3,2]]);
    color(plain_color) polyhedron([[0,0,0],[0,0,0],[0,0,0],[0,0,0]], [[0,1,3,2]]);
    color(plain_color) polyhedron([[0,0,0],[0,0,0],[0,0,0],[0,0,0]], [[0,1,3,2]]);
    color(plain_color) polyhedron([[0,0,0],[0,0,0],[0,0,0],[0,0,0]], [[0,1,3,2]]);
    color(plain_color) polyhedron([[0,0,0],[0,0,0],[0,0,0],[0,0,0]], [[0,1,3,2]]);
    color(plain_color) polyhedron([[0,0,0],[0,0,0],[0,0,0],[0,0,0]], [[0,1,3,2]]);
    color(plain_color) polyhedron([[0,0,0],[0,0,0],[0,0,0],[0,0,0]], [[0,1,3,2]]);
    color(plain_color) polyhedron([[0,0,0],[0,0,0],[0,0,0],[0,0,0]], [[0,1,3,2]]);
    color(plain_color) polyhedron([[0,0,0],[0,0,0],[0,0,0],[0,0,0]], [[0,1,3,2]]);
    color(plain_color) polyhedron([[0,0,0],[0,0,0],[0,0,0],[0,0,0]], [[0,1,3,2]]);
    color(plain_color) polyhedron([[0,0,0],[0,0,0],[0,0,0],[0,0,0]], [[0,1,3,2]]);
    color(plain_color) polyhedron([[0,0,0],[0,0,0],[0,0,0],[0,0,0]], [[0,1,3,2]]);
    color(plain_color) polyhedron([[0,0,0],[0,0,0],[0,0,0],[0,0,0]], [[0,1,3,2]]);
    color(plain_color) polyhedron([[0,0,0],[0,0,0],[0,0,0],[0,0,0]], [[0,1,3,2]]);
    color(plain_color) polyhedron([[0,0,0],[0,0,0],[0,0,0],[0,0,0]], [[0,1,3,2]]);
    color(plain_color) polyhedron([[0,0,0],[0,0,0],[0,0,0],[0,0,0]], [[0,1,3,2]]);
    color(plain_color) polyhedron([[0,0,0],[0,0,0],[0,0,0],[0,0,0]], [[0,1,3,2]]);
    color(plain_color) polyhedron([[0,0,0],[0,0,0],[0,0,0],[0,0,0]], [[0,1,3,2]]);
    color(plain_color) polyhedron([[0,0,0],[0,0,0],[0,0,0],[0,0,0]], [[0,1,3,2]]);
    color(plain_color) polyhedron([[0,0,0],[0,0,0],[0,0,0],[0,0,0]], [[0,1,3,2]]);
    color(plain_color) polyhedron([[0,0,0],[0,0,0],[0,0,0],[0,0,0]], [[0,1,3,2]]);
    color(plain_color) polyhedron([[0,0,0],[0,0,0],[0,0,0],[0,0,0]], [[0,1,3,2]]);
    color(plain_color) polyhedron([[0,0,0],[0,0,0],[0,0,0],[0,0,0]], [[0,1,3,2]]);
    color(plain_color) polyhedron([[0,0,0],[0,0,0],[0,0,0],[0,0,0]], [[0,1,3,2]]);
    color(plain_color) polyhedron([[0,0,0],[0,0,0],[0,0,0],[0,0,0]], [[0,1,3,2]]);
    color(plain_color) polyhedron([[0,0,0],[0,0,0],[0,0,0],[0,0,0]], [[0,1,3,2]]);
    color(plain_color) polyhedron([[0,0,0],[0,0,0],[0,0,0],[0,0,0]], [[0,1,3,2]]);
    color(plain_color) polyhedron([[0,0,0],[0,0,0],[0,0,0],[0,0,0]], [[0,1,3,2]]);
    color(plain_color) polyhedron([[0,0,0],[0,0,0],[0,0,0],[0,0,0]], [[0,1,3,2]]);
    color(plain_color) polyhedron([[0,0,0],[0,0,0],[0,0,0],[0,0,0]], [[0,1,3,2]]);
    color(plain_color) polyhedron([[0,0,0],[0,0,0],[0,0,0],[0,0,0]], [[0,1,3,2]]);
    color(plain_color) polyhedron([[0,0,0],[0,0,0],[0,0,0],[0,0,0]], [[0,1,3,2]]);
    color(plain_color) polyhedron([[0,0,0],[0,0,0],[0,0,0],[0,0,0]], [[0,1,3,2]]);
    color(plain_color) polyhedron([[0,0,0],[0,0,0],[0,0,0],[0,0,0]], [[0,1,3,2]]);
    color(plain_color) polyhedron([[0,0,0],[0,0,0],[0,0,0],[0,0,0]], [[0,1,3,2]]);
    color(plain_color) polyhedron([[0,0,0],[0,0,0],[0,0,0],[0,0,0]], [[0,1,3,2]]);
    color(plain_color) polyhedron([[0,0,0],[0,0,0],[0,0,0],[0,0,0]], [[0,1,3,2]]);
    color(plain_color) polyhedron([[0,0,0],[0,0,0],[0,0,0],[0,0,0]], [[0,1,3,2]]);
    color(plain_color) polyhedron([[0,0,0],[0,0,0],[0,0,0],[0,0,0]], [[0,1,3,2]]);
    color(plain_color) polyhedron([[0,0,0],[0,0,0],[0,0,0],[0,0,0]], [[0,1,3,2]]);
    color(plain_color) polyhedron([[0,0,0],[0,0,0],[0,0,0],[0,0,0]], [[0,1,3,2]]);
    color(plain_color) polyhedron([[0,0,0],[0,0,0],[0,0,0],[0,0,0]], [[0,1,3,2]]);
    color(plain_color) polyhedron([[0,0,0],[0,0,0],[0,0,0],[0,0,0]], [[0,1,3,2]]);
    color(plain_color) polyhedron([[0,0,0],[0,0,0],[0,0,0],[0,0,0]], [[0,1,3,2]]);
    color(plain_color) polyhedron([[0,0,0],[0,0,0],[0,0,0],[0,0,0]], [[0,1,3,2]]);
}
